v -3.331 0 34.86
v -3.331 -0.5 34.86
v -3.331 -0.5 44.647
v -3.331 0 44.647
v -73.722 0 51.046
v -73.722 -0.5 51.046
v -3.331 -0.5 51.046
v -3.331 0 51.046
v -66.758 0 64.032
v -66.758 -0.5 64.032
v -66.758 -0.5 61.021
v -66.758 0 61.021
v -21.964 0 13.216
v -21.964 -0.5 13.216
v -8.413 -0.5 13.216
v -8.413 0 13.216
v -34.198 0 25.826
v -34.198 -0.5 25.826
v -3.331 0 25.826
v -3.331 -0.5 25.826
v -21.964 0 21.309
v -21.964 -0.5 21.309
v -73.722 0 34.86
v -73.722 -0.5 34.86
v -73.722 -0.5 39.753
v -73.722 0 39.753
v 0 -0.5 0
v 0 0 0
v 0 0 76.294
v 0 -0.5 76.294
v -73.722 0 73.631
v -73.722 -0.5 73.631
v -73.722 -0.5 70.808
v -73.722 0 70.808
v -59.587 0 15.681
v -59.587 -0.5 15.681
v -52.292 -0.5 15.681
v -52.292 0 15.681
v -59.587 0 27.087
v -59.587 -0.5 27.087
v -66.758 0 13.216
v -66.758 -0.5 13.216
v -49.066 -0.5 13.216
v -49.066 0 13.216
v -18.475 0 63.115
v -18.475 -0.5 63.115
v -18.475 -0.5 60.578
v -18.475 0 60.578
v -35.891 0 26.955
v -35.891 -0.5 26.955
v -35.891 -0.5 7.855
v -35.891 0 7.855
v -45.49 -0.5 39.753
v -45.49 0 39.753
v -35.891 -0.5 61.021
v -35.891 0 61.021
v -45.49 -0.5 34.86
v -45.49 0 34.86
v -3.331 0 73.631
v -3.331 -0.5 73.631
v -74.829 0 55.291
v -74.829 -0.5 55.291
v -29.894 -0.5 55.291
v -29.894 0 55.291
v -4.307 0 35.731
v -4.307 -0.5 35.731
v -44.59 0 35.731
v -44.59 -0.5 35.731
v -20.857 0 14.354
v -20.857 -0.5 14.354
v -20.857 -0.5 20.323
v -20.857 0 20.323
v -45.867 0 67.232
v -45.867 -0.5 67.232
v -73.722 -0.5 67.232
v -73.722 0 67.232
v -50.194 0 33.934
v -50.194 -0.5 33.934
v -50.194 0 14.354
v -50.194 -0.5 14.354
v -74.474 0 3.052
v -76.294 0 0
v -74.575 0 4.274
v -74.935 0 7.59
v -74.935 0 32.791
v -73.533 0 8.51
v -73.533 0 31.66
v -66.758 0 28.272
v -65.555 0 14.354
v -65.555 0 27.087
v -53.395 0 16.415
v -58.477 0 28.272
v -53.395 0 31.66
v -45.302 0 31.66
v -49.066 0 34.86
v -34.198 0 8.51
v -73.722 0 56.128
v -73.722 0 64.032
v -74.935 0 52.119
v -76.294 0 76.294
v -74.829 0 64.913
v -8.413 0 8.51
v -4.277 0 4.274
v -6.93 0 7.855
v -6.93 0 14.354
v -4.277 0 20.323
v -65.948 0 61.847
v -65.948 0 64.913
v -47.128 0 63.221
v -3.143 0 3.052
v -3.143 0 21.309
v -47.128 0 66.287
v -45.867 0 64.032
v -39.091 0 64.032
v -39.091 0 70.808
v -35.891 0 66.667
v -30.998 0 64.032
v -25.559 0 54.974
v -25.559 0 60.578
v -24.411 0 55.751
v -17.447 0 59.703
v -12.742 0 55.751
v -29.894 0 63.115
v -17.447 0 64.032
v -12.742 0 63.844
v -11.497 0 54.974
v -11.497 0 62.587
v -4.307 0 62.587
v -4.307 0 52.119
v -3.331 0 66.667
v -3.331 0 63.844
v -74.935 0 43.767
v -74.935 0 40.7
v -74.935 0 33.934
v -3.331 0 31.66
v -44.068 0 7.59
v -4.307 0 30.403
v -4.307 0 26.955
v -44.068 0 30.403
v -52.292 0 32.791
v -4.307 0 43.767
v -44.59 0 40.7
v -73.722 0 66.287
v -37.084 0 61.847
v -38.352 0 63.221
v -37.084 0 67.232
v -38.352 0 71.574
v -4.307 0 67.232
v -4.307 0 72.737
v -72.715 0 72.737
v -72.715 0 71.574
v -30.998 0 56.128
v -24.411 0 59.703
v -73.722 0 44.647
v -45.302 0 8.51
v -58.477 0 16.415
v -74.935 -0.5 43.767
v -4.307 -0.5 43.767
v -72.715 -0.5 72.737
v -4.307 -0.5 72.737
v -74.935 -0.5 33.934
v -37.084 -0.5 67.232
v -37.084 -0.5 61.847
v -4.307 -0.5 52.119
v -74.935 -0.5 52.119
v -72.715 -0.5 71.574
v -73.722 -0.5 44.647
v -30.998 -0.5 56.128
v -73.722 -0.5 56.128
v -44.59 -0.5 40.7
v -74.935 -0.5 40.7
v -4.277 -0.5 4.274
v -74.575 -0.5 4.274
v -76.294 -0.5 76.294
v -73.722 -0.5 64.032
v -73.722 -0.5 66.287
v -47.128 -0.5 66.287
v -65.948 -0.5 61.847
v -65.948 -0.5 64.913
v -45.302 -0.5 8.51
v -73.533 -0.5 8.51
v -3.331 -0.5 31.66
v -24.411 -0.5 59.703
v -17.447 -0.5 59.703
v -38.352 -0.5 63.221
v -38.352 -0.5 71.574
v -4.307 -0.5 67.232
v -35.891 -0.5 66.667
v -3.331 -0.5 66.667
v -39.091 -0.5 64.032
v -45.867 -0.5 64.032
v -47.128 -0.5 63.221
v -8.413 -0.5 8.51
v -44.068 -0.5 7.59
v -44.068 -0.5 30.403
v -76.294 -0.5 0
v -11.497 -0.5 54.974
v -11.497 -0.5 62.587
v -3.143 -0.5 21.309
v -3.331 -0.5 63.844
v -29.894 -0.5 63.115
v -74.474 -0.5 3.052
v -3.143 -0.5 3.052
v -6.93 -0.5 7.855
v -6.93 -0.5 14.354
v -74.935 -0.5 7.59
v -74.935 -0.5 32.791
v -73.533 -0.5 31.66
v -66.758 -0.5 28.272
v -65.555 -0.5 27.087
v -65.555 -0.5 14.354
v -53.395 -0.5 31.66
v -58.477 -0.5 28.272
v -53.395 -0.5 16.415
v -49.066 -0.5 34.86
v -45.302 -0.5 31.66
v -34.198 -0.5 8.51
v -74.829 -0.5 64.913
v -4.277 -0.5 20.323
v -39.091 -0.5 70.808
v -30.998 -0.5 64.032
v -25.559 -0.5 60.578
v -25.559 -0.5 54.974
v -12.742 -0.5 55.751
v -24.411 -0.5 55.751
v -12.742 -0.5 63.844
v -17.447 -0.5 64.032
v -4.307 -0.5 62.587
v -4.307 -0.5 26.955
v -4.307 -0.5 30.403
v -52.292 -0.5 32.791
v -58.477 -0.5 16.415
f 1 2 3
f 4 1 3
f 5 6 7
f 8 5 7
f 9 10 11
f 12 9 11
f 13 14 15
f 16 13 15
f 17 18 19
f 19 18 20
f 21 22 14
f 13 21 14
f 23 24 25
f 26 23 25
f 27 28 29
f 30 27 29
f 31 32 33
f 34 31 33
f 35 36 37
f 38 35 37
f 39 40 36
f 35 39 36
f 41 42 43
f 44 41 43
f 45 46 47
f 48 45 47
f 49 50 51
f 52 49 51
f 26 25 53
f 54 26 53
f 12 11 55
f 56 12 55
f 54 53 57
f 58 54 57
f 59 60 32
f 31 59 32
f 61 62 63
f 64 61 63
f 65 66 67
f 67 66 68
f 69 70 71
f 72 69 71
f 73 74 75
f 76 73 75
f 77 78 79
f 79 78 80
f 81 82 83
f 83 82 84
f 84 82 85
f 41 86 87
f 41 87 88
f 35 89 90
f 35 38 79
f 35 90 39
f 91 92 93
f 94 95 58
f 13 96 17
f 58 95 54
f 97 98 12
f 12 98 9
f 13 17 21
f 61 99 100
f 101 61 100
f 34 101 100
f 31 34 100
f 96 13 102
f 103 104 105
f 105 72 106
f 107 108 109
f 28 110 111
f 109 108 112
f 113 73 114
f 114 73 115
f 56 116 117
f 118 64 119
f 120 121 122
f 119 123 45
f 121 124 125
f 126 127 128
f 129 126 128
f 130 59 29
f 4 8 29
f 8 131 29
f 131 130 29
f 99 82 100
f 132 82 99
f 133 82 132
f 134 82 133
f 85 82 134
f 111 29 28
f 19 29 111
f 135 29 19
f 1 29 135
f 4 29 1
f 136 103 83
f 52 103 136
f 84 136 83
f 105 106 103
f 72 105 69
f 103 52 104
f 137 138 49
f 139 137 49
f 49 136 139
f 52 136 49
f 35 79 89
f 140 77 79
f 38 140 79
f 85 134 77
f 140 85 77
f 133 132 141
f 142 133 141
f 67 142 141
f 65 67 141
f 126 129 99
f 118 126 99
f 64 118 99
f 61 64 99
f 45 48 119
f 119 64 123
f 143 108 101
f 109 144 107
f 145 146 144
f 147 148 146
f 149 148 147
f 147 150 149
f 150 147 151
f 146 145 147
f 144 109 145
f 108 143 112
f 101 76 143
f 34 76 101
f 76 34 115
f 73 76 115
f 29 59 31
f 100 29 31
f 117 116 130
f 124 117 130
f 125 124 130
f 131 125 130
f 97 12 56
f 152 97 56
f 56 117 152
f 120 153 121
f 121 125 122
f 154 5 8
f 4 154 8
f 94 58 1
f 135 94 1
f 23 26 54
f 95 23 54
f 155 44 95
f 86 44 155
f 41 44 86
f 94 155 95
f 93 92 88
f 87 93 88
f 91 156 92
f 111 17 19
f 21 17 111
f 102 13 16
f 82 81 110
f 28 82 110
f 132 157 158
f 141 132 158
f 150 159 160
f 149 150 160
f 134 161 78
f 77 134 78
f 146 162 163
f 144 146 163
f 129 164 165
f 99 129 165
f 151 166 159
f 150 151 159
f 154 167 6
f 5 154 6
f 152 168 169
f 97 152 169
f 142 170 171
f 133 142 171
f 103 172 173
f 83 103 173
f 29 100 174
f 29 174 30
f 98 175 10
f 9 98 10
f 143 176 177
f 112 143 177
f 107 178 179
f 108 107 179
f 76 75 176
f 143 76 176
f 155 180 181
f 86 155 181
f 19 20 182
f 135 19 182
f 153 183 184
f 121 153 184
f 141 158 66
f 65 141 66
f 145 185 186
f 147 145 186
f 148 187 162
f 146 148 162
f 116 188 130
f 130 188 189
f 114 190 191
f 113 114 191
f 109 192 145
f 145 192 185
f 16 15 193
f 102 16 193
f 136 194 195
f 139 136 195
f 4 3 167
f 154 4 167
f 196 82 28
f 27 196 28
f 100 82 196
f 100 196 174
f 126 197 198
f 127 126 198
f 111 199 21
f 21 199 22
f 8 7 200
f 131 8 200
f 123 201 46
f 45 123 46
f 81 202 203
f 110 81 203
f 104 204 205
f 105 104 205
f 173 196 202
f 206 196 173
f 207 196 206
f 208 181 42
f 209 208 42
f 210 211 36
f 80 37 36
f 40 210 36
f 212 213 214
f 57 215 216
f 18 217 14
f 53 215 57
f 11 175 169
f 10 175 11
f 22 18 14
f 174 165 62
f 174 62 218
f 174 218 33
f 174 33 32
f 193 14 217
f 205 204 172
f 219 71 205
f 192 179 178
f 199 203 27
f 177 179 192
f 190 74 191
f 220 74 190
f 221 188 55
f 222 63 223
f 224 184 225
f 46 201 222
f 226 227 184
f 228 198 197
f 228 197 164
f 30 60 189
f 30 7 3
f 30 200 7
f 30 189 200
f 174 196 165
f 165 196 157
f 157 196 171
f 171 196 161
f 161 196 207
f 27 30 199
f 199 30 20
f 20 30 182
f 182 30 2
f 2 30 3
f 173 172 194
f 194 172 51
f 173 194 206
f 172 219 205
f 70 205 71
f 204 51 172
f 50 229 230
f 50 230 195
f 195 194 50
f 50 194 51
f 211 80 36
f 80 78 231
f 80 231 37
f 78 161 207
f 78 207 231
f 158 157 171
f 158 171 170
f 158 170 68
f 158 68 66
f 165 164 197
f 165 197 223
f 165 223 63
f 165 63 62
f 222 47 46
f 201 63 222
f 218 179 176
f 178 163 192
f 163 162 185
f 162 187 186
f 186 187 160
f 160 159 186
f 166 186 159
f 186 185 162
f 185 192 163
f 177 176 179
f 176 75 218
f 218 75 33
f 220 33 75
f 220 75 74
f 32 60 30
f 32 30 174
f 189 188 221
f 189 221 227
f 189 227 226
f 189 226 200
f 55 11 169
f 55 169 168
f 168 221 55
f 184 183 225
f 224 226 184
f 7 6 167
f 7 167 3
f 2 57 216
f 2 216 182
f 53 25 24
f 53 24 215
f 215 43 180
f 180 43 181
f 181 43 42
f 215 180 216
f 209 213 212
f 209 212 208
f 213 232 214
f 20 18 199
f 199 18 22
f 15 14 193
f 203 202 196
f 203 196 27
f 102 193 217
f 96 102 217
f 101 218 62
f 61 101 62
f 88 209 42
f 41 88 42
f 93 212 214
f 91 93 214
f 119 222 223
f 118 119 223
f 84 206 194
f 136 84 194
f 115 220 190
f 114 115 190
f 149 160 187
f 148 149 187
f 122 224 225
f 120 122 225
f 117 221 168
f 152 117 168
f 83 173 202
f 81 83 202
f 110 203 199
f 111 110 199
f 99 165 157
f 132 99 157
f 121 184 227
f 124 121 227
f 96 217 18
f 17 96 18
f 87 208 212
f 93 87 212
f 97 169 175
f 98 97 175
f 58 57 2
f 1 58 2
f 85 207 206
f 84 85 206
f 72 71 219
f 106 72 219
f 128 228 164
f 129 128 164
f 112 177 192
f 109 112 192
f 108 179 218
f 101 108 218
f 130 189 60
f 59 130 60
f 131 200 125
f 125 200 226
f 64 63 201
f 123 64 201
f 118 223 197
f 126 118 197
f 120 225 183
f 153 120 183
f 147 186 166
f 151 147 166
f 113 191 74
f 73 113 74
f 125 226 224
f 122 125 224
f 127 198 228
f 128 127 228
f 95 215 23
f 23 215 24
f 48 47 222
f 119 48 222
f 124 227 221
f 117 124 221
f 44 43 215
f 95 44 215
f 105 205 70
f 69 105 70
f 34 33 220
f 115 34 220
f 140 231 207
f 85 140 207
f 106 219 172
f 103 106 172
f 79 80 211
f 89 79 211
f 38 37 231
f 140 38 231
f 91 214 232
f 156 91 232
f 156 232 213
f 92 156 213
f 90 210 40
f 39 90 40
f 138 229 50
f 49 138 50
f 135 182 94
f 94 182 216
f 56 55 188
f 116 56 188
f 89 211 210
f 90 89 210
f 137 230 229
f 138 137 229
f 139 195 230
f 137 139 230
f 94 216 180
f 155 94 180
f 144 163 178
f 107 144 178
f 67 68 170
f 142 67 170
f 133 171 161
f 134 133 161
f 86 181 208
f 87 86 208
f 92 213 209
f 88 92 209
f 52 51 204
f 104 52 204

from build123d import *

# Parameters (mm, degrees)
F0_W     = 76.294
F0_H     = 76.294
F1_DEPTH = 0.5
F3_DEPTH = 0.5


with BuildPart() as f1:
    # F0 (on Front) → F1 (new body)
    with BuildSketch(Plane.XZ):
        with Locations((-38.147, 38.147)):
            Rectangle(F0_W, F0_H)
    extrude(amount=F1_DEPTH)

    # F2 (on face) → F3 (cut)
    with BuildSketch(Plane.XZ.offset(0.5)):
        Polygon((-74.574612, 4.273814), (-74.474379, 3.052396), (-3.142937, 3.052396), (-3.142937, 21.308729), (-21.963898, 21.308729), (-21.963898, 13.215715), (-8.412805, 13.215715), (-8.412805, 8.510474), (-34.19752, 8.510474), (-34.19752, 25.825759), (-3.331146, 25.825759), (-3.331146, 31.660259), (-45.301888, 31.660259), (-45.301888, 8.510474), (-73.533334, 8.510474), (-73.533334, 31.660259), (-53.394902, 31.660259), (-53.394902, 16.415277), (-58.476564, 16.415277), (-58.476564, 28.272485), (-66.757783, 28.272485), (-66.757783, 13.215715), (-49.066082, 13.215715), (-49.066082, 34.859821), (-73.721543, 34.859821), (-73.721543, 39.753273), (-45.490101, 39.753273), (-45.490101, 34.859821), (-3.331146, 34.859821), (-3.331146, 44.646721), (-73.721543, 44.646721), (-73.721543, 51.04585), (-3.331146, 51.04585), (-3.331146, 63.8441), (-12.741626, 63.8441), (-12.741626, 55.751089), (-24.410622, 55.751089), (-24.410622, 59.703492), (-17.446866, 59.703492), (-17.446866, 64.032309), (-30.997958, 64.032309), (-30.997958, 56.127511), (-73.721543, 56.127511), (-73.721543, 64.032309), (-66.757783, 64.032309), (-66.757783, 61.020955), (-35.89141, 61.020955), (-35.89141, 66.667251), (-3.331146, 66.667251), (-3.331146, 73.631003), (-73.721543, 73.631003), (-73.721543, 70.807859), (-39.090972, 70.807859), (-39.090972, 64.032309), (-45.866519, 64.032309), (-45.866519, 67.231879), (-73.721543, 67.231879), (-73.721543, 66.287316), (-47.128003, 66.287316), (-47.128003, 63.221127), (-38.352344, 63.221127), (-38.352344, 71.573861), (-72.714865, 71.573861), (-72.714865, 72.736897), (-4.307025, 72.736897), (-4.307025, 67.231879), (-37.083577, 67.231879), (-37.083577, 61.846625), (-65.948091, 61.846625), (-65.948091, 64.912818), (-74.829482, 64.912818), (-74.829482, 55.291314), (-29.893881, 55.291314), (-29.893881, 63.115396), (-18.474953, 63.115396), (-18.474953, 60.577855), (-25.558917, 60.577855), (-25.558917, 54.97412), (-11.496719, 54.97412), (-11.496719, 62.58674), (-4.307025, 62.58674), (-4.307025, 52.119389), (-74.935205, 52.119389), (-74.935205, 43.766655), (-4.307025, 43.766655), (-4.307025, 35.731114), (-44.590466, 35.731114), (-44.590466, 40.700462), (-74.935205, 40.700462), (-74.935205, 33.933688), (-50.194196, 33.933688), (-50.194196, 14.354197), (-65.555319, 14.354197), (-65.555319, 27.087314), (-59.586674, 27.087314), (-59.586674, 15.680563), (-52.291658, 15.680563), (-52.291658, 32.790691), (-74.935205, 32.790691), (-74.935205, 7.589729), (-44.068187, 7.589729), (-44.068187, 30.40323), (-4.307025, 30.40323), (-4.307025, 26.954677), (-35.89141, 26.954677), (-35.89141, 7.855003), (-6.929931, 7.855003), (-6.929931, 14.354197), (-20.856777, 14.354197), (-20.856777, 20.322846), (-4.277199, 20.322846), (-4.277199, 4.273814), align=None)
    extrude(amount=-F3_DEPTH, mode=Mode.SUBTRACT)


solid = f1.part
